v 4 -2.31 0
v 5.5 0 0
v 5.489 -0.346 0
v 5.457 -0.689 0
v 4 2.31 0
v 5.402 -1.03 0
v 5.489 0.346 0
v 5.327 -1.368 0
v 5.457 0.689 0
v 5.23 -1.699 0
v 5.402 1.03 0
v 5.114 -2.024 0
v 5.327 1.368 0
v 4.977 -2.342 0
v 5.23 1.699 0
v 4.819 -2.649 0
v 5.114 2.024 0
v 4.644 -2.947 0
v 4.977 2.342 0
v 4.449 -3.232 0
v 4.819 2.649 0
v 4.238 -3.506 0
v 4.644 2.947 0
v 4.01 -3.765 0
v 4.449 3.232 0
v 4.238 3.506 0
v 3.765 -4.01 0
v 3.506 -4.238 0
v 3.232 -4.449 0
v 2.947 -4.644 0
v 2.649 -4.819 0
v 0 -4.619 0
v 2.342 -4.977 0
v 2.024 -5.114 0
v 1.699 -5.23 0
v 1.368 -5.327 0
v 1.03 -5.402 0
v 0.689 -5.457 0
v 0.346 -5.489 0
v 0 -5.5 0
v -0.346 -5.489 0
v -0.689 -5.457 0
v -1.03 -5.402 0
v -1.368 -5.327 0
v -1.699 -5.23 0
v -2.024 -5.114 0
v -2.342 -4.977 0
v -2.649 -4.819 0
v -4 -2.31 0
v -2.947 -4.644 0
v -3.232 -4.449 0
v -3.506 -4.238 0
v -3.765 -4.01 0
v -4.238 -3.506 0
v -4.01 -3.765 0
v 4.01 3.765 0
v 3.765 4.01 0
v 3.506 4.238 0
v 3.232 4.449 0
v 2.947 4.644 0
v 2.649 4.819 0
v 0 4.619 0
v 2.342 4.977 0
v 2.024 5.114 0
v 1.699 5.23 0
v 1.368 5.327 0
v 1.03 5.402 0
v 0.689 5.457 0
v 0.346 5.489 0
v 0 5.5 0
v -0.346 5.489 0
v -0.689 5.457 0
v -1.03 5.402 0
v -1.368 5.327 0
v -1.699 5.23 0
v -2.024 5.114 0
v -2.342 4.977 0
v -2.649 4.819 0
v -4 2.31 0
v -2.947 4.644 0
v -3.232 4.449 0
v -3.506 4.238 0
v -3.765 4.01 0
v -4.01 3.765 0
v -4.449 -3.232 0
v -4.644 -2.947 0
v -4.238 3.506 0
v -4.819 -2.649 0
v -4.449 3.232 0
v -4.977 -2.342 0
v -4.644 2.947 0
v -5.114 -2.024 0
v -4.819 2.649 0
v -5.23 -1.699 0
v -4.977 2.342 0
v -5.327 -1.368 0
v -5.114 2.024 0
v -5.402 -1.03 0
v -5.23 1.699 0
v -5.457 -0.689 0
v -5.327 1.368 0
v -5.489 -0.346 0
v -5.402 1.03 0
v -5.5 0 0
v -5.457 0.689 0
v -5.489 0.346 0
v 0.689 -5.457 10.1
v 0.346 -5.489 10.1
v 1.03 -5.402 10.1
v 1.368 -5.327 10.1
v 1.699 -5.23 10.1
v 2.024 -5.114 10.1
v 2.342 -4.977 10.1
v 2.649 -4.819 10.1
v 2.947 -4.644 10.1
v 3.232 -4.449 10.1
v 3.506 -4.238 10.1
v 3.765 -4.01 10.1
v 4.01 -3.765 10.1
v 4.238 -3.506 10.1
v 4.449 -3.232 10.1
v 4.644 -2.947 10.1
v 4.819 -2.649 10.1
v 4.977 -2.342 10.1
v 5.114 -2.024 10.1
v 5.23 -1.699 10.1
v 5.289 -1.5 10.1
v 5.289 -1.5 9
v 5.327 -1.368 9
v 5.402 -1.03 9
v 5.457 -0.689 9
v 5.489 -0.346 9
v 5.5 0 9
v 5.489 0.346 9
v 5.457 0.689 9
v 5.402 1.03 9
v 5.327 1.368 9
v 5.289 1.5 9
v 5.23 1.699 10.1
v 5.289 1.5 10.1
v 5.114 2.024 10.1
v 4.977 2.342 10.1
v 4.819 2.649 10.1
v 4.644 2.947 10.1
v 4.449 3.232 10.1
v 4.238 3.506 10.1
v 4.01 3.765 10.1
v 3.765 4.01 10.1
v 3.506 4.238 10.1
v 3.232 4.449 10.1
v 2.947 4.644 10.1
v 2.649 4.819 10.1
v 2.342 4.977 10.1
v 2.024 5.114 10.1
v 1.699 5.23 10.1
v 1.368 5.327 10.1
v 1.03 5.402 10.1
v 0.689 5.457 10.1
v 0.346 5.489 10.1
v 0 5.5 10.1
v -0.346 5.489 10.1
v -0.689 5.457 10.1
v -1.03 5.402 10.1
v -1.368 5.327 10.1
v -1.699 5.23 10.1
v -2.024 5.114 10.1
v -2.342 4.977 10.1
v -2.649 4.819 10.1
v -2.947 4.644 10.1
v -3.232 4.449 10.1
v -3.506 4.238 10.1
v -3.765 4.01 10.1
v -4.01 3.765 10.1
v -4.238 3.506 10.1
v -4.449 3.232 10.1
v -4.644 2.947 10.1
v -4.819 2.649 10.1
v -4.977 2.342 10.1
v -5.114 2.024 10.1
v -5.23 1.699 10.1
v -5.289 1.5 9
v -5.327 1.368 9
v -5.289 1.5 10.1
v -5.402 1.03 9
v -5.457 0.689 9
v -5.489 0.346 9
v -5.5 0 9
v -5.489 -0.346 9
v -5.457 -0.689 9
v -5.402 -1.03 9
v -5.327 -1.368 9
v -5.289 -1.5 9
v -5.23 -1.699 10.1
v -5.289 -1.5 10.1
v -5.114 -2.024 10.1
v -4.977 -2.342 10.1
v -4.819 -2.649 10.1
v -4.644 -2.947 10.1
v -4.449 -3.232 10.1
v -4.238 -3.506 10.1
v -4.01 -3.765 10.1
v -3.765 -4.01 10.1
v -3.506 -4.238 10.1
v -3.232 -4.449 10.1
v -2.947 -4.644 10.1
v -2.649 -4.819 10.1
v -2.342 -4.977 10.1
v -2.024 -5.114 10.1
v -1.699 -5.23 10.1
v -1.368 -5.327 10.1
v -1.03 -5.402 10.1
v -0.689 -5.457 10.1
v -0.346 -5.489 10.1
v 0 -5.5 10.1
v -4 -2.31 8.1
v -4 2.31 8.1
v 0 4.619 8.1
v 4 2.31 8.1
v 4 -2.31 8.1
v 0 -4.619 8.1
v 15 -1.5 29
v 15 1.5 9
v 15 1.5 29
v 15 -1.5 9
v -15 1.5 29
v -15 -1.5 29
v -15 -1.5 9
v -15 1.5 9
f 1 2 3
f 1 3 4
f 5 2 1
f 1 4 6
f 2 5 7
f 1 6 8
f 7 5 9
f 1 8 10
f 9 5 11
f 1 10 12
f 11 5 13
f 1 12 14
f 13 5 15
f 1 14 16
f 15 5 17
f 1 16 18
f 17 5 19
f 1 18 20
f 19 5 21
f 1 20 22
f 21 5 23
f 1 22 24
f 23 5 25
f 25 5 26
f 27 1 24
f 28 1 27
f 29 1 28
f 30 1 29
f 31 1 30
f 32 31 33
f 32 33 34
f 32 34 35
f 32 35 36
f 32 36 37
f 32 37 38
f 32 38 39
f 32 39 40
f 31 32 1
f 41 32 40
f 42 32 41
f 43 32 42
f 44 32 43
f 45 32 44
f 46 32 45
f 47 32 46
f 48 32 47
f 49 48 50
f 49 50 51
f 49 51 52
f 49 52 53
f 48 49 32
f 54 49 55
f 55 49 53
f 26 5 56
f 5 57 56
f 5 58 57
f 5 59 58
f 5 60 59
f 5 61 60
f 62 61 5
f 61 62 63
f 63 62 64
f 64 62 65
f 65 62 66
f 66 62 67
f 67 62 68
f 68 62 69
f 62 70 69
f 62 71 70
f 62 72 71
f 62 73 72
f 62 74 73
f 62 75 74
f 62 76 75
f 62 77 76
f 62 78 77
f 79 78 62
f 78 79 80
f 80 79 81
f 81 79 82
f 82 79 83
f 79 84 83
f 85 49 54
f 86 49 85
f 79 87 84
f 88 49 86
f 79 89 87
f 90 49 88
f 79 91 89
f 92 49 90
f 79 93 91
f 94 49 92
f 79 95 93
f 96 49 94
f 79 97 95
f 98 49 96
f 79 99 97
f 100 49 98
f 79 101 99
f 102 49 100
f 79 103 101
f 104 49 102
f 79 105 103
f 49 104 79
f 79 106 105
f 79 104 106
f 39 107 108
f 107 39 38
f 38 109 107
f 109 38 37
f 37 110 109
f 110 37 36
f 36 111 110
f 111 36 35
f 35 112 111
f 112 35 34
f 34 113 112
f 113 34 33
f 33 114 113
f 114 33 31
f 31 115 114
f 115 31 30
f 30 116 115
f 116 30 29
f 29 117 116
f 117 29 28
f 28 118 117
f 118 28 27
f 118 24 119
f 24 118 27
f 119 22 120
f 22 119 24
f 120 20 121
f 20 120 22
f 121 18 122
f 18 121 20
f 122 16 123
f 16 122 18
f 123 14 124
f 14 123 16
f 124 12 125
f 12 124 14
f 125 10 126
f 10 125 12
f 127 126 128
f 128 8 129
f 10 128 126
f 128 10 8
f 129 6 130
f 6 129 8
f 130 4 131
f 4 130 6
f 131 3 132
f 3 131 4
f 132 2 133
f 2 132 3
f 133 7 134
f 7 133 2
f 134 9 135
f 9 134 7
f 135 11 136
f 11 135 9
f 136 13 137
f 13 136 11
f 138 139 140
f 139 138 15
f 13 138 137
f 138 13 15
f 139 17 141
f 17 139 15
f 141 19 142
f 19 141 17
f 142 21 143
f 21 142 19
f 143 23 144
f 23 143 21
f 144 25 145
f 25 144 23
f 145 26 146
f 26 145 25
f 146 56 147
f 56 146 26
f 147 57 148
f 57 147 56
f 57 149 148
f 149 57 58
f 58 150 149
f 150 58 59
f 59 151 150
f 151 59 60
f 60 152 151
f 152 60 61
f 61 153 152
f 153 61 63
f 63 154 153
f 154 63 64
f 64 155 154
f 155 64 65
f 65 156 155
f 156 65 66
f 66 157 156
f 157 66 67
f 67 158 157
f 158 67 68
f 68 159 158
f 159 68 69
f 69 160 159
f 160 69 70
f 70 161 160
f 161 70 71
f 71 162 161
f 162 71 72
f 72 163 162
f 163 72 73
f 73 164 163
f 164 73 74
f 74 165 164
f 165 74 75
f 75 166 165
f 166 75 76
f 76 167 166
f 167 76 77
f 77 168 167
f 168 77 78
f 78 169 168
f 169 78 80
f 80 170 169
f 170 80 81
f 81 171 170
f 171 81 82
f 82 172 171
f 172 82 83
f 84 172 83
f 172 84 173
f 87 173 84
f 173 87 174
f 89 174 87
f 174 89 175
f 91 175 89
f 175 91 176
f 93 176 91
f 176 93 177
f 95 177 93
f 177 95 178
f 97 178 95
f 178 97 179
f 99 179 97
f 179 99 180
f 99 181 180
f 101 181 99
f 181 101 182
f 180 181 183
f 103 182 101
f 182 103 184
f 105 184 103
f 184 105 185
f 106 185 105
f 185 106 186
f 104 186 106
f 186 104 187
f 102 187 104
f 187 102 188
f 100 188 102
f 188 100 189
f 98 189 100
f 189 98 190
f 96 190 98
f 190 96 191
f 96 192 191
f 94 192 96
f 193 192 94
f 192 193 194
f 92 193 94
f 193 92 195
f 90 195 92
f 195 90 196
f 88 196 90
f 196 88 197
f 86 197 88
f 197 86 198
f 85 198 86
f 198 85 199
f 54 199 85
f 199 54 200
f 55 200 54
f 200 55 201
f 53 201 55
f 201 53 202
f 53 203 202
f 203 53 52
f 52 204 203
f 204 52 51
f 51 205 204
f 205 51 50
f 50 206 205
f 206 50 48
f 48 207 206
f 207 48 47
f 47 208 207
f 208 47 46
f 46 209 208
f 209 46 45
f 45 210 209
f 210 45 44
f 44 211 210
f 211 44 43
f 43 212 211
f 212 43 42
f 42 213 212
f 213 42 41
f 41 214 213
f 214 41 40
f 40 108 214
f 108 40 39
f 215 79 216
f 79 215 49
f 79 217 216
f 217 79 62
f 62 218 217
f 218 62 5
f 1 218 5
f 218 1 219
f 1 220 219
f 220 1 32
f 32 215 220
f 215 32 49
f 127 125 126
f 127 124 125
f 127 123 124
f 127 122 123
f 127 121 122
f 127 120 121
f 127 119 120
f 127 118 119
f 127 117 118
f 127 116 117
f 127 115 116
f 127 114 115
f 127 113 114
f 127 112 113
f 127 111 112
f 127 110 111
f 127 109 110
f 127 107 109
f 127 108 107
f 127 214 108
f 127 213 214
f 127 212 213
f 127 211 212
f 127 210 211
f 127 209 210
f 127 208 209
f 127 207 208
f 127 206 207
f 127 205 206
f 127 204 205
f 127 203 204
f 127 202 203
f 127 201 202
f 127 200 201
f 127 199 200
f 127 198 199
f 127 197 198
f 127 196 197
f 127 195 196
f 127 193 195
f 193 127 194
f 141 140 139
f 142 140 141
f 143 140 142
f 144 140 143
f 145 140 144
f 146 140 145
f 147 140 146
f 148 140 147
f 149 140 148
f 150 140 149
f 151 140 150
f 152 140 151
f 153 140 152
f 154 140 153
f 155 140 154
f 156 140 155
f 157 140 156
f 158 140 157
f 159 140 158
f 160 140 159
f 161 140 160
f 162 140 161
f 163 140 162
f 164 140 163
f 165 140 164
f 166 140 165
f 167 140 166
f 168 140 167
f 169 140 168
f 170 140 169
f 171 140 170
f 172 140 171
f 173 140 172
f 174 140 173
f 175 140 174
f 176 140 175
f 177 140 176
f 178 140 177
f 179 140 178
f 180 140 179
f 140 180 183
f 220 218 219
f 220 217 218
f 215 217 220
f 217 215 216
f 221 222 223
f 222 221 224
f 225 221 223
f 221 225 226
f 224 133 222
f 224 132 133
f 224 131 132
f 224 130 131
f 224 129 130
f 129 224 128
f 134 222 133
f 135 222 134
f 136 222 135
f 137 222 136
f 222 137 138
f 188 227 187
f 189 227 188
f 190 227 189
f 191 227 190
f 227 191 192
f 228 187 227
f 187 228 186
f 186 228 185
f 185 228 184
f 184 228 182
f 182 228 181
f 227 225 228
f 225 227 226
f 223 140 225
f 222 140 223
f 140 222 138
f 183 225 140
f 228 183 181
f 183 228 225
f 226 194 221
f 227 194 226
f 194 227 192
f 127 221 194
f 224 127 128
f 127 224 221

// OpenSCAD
linear_extrude(height = 10,$fn=100)
   import (file = "pied-photo.dxf", layer = "0");
translate([0,0,8.1])linear_extrude(height = 2,$fn=100)
   import (file = "pied-photo.dxf", layer = "1");
   translate([0,0,19]) cube([30,3,20], center=true);
   
